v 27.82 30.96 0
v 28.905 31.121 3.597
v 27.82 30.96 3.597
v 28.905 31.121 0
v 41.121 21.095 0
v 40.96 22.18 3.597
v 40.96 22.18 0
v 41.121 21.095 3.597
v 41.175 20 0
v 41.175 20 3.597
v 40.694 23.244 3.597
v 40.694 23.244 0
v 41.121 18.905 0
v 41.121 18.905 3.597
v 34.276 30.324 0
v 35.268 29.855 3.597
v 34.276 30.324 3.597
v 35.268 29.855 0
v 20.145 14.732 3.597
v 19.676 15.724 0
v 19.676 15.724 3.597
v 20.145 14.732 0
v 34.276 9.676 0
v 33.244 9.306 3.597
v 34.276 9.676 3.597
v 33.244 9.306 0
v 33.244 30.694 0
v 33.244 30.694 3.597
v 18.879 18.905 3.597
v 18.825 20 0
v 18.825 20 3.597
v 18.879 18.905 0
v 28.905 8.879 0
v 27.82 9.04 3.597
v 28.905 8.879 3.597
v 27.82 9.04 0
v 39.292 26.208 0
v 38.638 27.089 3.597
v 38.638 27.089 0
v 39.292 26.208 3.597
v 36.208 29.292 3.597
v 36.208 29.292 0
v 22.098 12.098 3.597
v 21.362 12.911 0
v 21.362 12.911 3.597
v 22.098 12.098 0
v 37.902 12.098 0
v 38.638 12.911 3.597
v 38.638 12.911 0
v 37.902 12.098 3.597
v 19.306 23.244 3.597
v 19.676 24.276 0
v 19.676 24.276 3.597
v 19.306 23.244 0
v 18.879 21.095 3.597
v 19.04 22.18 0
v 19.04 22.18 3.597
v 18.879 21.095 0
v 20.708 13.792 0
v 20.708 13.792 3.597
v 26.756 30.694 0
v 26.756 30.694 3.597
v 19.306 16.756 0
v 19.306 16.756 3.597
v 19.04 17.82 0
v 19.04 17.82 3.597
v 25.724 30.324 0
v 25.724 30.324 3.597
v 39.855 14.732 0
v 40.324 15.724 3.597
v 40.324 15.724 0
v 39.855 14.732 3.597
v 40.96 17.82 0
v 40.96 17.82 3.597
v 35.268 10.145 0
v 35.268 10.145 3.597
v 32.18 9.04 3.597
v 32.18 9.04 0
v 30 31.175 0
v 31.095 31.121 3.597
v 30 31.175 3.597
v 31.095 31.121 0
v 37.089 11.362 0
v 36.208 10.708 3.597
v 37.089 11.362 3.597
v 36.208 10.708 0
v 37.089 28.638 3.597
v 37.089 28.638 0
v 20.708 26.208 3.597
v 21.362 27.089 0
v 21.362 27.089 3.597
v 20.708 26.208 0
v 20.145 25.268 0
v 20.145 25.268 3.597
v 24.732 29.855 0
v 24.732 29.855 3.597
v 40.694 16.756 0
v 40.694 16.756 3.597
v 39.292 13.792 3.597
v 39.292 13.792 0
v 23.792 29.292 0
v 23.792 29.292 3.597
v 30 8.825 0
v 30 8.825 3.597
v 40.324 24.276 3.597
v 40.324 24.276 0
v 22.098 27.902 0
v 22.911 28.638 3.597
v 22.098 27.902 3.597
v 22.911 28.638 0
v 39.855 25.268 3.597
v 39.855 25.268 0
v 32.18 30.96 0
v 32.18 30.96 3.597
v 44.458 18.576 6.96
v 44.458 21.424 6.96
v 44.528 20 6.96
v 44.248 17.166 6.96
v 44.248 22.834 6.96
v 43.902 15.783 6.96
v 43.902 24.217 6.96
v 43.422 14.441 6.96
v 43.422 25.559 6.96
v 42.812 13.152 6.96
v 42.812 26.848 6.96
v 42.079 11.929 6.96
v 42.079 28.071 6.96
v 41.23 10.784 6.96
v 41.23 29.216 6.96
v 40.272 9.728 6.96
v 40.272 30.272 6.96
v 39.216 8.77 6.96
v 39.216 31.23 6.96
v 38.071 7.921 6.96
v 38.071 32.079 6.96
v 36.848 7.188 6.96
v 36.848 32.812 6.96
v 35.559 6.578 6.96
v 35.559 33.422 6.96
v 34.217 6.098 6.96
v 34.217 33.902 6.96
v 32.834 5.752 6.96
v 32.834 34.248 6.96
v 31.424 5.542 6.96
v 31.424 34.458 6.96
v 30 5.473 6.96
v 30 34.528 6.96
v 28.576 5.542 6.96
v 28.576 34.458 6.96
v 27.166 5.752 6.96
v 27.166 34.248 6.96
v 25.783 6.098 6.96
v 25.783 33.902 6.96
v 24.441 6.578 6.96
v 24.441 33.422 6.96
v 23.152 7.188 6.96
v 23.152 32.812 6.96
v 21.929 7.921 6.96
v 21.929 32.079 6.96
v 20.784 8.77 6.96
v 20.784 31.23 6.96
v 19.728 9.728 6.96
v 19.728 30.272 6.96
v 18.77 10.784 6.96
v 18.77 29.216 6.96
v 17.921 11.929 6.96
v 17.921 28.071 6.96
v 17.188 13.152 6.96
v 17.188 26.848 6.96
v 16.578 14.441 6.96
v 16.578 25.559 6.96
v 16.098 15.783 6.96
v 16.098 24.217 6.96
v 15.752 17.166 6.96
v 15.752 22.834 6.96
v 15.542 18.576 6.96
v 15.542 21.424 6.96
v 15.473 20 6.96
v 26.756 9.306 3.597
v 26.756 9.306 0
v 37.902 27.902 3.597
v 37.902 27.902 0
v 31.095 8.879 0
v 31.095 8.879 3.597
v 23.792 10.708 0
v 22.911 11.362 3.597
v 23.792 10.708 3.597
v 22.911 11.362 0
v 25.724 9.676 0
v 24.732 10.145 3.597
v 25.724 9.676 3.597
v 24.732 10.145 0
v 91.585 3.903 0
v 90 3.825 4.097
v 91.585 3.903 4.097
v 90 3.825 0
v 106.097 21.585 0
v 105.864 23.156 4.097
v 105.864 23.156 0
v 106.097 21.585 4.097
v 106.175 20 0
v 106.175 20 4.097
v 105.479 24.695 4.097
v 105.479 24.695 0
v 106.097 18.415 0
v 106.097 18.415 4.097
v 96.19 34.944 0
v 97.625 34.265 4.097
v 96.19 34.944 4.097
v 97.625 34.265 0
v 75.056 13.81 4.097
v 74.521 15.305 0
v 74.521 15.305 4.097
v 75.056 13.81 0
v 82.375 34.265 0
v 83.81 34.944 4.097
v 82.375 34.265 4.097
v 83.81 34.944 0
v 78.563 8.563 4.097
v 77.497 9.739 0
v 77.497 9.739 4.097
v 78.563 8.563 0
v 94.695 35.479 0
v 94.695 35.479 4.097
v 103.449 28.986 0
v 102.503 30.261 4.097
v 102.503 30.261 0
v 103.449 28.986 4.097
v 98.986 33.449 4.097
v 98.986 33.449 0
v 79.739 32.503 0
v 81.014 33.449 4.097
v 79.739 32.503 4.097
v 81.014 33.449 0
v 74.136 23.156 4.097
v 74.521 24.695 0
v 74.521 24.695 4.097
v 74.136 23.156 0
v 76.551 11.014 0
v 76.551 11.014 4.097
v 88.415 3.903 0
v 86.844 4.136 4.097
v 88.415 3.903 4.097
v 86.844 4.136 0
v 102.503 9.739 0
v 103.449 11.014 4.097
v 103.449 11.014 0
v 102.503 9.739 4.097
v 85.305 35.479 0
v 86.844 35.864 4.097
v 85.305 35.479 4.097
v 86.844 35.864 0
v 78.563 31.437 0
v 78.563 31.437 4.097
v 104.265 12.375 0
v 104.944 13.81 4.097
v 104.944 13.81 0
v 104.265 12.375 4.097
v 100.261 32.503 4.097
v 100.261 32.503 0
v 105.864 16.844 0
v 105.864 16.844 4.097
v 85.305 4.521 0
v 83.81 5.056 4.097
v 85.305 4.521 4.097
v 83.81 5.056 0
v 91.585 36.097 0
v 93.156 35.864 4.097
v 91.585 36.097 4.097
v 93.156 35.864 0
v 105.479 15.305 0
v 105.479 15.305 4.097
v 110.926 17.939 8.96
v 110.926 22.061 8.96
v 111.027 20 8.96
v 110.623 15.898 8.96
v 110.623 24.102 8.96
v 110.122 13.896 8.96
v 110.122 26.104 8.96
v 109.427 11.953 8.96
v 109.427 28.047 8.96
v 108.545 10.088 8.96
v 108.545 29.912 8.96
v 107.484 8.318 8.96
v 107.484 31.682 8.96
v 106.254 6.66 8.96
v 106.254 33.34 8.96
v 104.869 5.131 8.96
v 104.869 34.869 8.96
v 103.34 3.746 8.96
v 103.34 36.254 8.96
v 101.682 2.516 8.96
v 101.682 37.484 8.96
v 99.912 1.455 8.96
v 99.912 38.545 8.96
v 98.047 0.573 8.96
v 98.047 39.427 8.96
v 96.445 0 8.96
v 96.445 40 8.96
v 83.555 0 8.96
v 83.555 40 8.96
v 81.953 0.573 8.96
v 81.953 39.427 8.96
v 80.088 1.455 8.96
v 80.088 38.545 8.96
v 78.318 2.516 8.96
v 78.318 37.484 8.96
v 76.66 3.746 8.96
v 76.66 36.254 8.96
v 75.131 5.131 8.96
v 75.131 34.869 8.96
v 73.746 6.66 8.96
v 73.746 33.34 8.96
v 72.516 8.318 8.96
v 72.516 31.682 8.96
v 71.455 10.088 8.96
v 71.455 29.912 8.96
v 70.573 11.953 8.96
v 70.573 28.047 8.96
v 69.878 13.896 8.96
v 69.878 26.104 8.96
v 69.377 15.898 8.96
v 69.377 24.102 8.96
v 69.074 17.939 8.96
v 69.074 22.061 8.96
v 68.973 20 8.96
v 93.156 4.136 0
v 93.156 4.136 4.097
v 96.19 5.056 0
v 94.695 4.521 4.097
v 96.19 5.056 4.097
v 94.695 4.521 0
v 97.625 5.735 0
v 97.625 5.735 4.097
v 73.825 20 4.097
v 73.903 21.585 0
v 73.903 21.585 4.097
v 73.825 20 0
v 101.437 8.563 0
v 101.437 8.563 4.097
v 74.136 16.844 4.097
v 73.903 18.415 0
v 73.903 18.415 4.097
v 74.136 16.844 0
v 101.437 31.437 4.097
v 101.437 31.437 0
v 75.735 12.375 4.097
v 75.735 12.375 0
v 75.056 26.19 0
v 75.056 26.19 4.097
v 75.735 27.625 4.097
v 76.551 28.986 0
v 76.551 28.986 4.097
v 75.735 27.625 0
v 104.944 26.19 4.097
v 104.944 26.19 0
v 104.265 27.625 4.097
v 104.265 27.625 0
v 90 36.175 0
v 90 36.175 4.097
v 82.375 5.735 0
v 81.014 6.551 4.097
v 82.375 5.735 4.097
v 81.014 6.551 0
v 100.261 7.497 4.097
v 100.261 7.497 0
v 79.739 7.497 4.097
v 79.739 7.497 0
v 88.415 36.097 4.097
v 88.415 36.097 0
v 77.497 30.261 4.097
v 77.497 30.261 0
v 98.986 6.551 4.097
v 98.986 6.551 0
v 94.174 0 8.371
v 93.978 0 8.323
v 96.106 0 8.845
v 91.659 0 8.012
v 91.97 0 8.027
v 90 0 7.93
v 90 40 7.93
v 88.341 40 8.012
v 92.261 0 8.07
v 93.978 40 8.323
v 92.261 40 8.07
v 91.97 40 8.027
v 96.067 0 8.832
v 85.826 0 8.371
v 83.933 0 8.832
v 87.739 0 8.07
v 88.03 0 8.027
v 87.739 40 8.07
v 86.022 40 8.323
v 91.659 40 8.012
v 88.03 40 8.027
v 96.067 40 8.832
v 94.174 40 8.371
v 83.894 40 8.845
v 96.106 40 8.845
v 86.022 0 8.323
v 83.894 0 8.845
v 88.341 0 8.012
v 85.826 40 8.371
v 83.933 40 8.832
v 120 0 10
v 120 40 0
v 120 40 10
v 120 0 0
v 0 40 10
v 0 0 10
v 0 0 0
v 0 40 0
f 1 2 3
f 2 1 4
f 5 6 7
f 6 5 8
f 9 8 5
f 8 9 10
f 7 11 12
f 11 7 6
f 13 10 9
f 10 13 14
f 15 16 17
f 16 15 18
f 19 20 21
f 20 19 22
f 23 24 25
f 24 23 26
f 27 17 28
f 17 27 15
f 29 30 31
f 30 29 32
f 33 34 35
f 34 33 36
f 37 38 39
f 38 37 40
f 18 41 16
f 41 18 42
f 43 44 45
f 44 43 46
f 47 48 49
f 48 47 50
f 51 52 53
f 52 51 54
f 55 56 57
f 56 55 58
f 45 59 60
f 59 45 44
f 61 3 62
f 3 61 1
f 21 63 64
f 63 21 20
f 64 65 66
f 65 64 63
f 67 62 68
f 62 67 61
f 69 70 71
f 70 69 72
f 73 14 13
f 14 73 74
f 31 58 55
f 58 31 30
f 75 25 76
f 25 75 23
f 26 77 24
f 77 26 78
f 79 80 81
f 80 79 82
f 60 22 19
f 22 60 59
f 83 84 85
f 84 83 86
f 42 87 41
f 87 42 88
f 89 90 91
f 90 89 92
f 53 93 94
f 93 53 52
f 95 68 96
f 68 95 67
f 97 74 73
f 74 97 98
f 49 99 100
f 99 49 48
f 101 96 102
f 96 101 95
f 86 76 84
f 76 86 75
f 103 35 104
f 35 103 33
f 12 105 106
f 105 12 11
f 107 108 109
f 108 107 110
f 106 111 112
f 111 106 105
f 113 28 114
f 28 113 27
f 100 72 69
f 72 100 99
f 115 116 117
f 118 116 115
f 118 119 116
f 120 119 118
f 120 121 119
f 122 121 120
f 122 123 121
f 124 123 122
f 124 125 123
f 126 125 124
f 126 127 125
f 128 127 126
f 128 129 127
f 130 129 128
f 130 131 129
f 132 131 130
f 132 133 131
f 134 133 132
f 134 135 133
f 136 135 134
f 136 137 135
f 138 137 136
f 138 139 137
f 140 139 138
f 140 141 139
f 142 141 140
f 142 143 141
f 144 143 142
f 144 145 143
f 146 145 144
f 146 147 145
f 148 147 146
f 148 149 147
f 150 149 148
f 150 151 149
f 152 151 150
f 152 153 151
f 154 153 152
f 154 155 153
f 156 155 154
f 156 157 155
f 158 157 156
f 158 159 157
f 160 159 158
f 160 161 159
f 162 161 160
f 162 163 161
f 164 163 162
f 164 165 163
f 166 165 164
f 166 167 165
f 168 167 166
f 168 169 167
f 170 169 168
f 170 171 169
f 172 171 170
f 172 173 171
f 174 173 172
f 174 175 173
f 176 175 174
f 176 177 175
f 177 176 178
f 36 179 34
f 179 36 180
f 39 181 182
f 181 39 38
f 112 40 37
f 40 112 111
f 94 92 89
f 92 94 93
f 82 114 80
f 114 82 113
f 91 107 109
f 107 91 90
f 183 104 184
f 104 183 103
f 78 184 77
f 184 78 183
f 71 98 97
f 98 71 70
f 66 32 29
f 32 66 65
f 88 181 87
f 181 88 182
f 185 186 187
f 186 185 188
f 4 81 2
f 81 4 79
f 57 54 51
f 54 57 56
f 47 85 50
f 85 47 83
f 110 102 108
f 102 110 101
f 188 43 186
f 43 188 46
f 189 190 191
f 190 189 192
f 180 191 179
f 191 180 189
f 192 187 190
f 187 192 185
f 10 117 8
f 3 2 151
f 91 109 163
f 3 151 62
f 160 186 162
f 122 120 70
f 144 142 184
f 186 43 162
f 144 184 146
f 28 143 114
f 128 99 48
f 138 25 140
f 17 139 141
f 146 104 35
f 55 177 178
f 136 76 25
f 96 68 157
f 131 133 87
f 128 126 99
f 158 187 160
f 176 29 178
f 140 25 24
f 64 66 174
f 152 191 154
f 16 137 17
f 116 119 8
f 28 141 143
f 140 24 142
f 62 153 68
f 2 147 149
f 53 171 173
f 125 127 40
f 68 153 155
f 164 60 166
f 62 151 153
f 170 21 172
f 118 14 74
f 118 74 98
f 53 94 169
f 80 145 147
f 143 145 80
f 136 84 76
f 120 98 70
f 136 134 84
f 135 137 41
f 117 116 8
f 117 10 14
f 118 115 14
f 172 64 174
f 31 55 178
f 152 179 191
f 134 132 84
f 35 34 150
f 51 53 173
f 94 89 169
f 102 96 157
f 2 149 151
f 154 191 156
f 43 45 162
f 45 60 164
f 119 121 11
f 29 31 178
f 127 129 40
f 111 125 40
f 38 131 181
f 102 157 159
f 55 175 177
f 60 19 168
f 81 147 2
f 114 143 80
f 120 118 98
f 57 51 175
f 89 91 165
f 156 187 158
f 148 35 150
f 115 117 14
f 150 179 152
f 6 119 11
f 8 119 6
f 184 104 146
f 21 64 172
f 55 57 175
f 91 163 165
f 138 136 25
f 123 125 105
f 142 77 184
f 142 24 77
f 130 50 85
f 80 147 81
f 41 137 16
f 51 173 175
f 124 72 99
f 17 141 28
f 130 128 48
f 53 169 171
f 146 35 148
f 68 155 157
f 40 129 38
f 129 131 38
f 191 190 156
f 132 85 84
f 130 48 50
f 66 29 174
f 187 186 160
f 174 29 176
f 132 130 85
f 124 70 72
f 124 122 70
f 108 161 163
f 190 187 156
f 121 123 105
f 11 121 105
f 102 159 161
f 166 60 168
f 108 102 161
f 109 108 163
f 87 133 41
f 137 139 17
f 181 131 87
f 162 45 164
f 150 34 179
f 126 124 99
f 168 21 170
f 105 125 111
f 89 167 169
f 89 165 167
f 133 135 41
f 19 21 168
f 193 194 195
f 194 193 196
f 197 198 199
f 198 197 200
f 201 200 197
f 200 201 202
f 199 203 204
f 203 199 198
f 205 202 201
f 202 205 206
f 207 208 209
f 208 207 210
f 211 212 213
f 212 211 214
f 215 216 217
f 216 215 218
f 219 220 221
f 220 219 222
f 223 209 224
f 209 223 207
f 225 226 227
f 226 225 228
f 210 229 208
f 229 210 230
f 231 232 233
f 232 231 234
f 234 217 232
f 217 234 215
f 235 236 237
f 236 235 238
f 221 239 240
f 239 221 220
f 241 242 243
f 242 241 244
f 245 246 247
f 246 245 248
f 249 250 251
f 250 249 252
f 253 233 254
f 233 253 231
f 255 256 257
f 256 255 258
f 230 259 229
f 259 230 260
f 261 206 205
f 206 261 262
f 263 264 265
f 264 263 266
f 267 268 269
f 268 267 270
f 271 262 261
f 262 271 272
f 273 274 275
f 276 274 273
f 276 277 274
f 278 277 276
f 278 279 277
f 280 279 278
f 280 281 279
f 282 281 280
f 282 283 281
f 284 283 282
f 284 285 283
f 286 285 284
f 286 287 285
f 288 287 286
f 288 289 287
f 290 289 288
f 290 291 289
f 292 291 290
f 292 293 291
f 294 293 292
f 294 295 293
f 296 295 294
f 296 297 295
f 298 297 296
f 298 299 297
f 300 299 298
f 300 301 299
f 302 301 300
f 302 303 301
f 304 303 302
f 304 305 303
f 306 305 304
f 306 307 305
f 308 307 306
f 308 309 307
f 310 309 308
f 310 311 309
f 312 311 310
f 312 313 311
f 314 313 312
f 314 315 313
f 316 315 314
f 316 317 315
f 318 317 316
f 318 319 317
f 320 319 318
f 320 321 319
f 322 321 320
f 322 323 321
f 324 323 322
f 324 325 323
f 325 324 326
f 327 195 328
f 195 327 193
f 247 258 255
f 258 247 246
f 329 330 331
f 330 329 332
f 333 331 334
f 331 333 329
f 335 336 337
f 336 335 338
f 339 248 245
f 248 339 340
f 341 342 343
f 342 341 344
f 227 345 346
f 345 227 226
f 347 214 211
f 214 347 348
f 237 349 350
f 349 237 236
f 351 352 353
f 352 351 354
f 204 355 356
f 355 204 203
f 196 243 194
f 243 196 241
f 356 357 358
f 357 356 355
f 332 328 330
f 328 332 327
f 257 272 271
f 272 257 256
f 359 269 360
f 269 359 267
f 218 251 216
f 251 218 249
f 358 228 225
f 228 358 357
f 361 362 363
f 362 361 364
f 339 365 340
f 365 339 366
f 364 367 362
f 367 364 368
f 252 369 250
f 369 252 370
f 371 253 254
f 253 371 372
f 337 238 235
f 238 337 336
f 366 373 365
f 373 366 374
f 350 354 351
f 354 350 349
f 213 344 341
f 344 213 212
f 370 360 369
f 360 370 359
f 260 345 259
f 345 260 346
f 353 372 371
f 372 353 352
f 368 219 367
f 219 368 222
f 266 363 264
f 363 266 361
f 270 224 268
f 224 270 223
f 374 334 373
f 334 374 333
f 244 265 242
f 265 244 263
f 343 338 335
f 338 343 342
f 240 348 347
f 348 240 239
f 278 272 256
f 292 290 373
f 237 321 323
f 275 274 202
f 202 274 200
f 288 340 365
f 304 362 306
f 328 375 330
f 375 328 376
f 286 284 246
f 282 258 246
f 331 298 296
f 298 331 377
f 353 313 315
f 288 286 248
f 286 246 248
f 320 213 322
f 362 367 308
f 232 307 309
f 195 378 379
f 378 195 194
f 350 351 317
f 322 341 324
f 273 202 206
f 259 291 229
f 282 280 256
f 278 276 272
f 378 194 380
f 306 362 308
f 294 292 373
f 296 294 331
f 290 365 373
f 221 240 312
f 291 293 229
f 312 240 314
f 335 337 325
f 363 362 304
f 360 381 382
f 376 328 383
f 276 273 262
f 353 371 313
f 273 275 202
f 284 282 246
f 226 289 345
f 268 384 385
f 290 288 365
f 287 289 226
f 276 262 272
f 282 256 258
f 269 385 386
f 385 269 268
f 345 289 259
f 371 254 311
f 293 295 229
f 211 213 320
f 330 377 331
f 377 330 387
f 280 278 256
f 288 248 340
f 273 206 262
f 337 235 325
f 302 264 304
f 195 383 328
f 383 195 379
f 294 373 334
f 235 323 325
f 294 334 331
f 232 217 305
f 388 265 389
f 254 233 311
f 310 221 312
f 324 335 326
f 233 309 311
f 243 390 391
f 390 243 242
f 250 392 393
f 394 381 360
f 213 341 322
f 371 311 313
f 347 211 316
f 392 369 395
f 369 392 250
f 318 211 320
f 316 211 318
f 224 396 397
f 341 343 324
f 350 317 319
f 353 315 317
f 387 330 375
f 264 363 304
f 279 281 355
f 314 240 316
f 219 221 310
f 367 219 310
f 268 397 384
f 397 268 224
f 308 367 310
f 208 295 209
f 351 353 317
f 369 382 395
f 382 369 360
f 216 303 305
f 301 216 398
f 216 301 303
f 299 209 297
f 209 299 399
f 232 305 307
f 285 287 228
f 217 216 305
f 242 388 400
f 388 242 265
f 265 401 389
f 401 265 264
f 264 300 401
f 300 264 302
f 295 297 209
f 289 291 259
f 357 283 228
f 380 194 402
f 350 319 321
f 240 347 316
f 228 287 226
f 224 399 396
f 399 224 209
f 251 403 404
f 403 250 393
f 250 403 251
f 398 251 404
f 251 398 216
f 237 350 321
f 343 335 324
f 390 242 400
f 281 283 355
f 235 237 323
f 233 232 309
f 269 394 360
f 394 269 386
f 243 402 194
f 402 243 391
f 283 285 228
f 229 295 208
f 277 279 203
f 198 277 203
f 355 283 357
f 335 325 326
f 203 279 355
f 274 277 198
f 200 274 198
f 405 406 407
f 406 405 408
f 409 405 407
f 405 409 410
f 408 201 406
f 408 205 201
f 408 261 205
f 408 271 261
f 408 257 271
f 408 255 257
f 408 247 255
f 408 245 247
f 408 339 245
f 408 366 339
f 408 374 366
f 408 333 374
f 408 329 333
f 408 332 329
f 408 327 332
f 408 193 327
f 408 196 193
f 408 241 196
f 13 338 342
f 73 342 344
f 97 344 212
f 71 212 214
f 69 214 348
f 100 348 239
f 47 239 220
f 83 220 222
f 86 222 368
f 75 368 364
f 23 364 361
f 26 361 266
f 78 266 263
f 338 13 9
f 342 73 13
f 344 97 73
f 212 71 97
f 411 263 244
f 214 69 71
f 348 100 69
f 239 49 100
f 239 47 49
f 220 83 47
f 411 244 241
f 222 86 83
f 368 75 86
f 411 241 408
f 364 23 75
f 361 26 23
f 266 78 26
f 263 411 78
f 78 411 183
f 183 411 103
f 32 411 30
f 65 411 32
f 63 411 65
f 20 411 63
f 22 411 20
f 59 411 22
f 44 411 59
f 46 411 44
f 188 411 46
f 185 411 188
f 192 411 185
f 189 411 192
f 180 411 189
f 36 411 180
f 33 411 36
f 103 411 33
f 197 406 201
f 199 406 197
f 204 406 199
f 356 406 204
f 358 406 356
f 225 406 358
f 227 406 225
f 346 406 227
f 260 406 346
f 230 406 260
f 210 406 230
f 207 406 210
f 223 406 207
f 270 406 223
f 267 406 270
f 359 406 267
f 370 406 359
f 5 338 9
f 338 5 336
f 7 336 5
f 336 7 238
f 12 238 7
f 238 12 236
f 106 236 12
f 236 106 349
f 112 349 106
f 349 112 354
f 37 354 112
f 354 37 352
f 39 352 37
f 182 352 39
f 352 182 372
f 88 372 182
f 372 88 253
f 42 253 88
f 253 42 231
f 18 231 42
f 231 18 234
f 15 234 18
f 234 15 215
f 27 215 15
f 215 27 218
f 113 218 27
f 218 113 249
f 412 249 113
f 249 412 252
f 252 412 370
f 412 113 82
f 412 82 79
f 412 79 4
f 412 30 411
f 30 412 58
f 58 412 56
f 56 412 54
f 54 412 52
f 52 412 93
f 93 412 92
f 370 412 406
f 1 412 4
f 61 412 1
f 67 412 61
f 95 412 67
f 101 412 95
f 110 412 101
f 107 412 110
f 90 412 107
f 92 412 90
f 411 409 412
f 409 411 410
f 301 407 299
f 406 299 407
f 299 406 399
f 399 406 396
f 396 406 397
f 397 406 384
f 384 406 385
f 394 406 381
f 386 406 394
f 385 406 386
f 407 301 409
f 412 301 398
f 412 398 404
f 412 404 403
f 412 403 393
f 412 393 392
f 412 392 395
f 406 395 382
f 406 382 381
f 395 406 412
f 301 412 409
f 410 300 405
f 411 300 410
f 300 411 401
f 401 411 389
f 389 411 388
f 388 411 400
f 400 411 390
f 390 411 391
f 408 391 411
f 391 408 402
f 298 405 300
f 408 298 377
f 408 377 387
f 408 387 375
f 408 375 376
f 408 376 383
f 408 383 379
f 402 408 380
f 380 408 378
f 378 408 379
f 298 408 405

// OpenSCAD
// file: bearing_iso15.consts.scad
// GENERATED from spec.json by scripts/gen-consts.mjs — DO NOT EDIT.
// interface: bearing_iso15 v0.1.0

B608__BORE = 8;
B608__OD = 22;
B608__WIDTH = 7;
B625__BORE = 5;
B625__OD = 16;
B625__WIDTH = 5;
B6001__BORE = 12;
B6001__OD = 28;
B6001__WIDTH = 8;
B6002__BORE = 15;
B6002__OD = 32;
B6002__WIDTH = 9;
SEAT__MIN_WALL = 2;
SEAT__LIP = 1.2;
SEAT__SHOULDER_CLEARANCE = 0.5;
// file: ../../lib/asm.scad
// ============================================================================
// lib/asm.scad — typed mating features, mirroring the engine's assembly.scad
// ----------------------------------------------------------------------------
// Same signatures, same geometry language, same conventions as the main
// engine (Procedura lib/assembly.scad):
//   * MALE / additive solids  (asm_peg)   -> union() onto the part.
//   * FEMALE / negative tools (asm_socket) -> subtract from the part.
//   * every male tip and female mouth carries a lead-in chamfer so parts
//     self-centre as they seat.
//   * male and female pair from ONE shared nominal + signed fit offset.
// The fit values come from lib/fits.scad — nothing here owns a tolerance.

include <fits.scad>;

// ---- peg ↔ socket ----------------------------------------------------------
// MALE peg, base at origin, growing +Z, chamfered self-centring tip.
module asm_peg(d, len) {
    lead = fit_lead(d);
    union() {
        cylinder(h = max(0.01, len - lead), d = d);
        translate([0, 0, len - lead])
            cylinder(h = lead, d1 = d, d2 = max(0.2, d - 2 * lead));
    }
}

// FEMALE socket, cut from the SAME nominal as its peg. Bore grows with the
// fit class; mouth chamfer eases insertion.
module asm_socket(d, depth, cls = "location") {
    bore = fit_d(d, cls);
    lead = fit_lead(bore);
    union() {
        translate([0, 0, -0.01]) cylinder(h = depth + 0.02, d = bore);
        translate([0, 0, depth - lead])
            cylinder(h = lead + 0.01, d1 = bore, d2 = bore + 2 * lead);
    }
}

// ---- through hole / counterbore --------------------------------------------
// Plain through hole for a fastener of nominal thread d, ISO-273-style.
module asm_through_hole(d, cls = "clearance") {
    bore = fit_d(d, cls);
    lead = fit_lead(bore);
    union() {
        translate([0, 0, -0.01]) cylinder(h = 100000, d = bore, center = false);
        // both mouths chamfered
        translate([0, 0, -0.01 + 100000 - 0.01]) cylinder(h = lead, d1 = bore, d2 = bore + 2 * lead);
    }
}

// Counterbore for a cap/button head: head pocket + shank clearance, both
// derived from the same nominal head diameter and thread.
module asm_counterbore(head_d, head_k, thread_d, cls = "clearance") {
    lead = fit_lead(head_d);
    union() {
        asm_through_hole(thread_d, cls);
        translate([0, 0, -0.01])
            cylinder(h = head_k + fit_delta_d("location"), d = fit_d(head_d, cls));
        translate([0, 0, head_k + fit_delta_d("location") - lead])
            cylinder(h = lead + 0.01, d1 = fit_d(head_d, cls), d2 = fit_d(head_d, cls) + 2 * lead);
    }
}

// ---- nut traps ---------------------------------------------------------------
// Hex nut trap: across-flats s, nut thickness m, from the SAME s.
// Oriented flat-down, opening at -Z (subtract from the part's underside).
module asm_hex_nut_trap(s, m, cls = "location") {
    af = fit_d(s, cls);
    translate([0, 0, -0.01]) {
        cylinder(h = m + fit_delta_d("location") + 0.01, d = af / cos(30), $fn = 6);
        // lead-in on the outer mouth (deeper into the part is -Z here)
        translate([0, 0, m + fit_delta_d("location") - 0.01])
            cylinder(h = fit_lead(af), d1 = af / cos(30), d2 = af / cos(30) + 2 * fit_lead(af), $fn = 6);
    }
}

// Square nut trap: side s, thickness m.
module asm_square_nut_trap(s, m, cls = "location") {
    side = fit_d(s, cls);
    lead = fit_lead(side);
    translate([0, 0, -0.01]) {
        translate([-side / 2, -side / 2, 0])
            cube([side, side, m + fit_delta_d("location") + 0.01]);
        translate([-side / 2, -side / 2, m + fit_delta_d("location") - 0.01])
            cube([side + 2 * lead, side + 2 * lead, lead + 0.02]);
    }
}

// ---- heat-set insert boss -----------------------------------------------------
// Solid boss (MALE — union it on): outer bore holds a brass insert of
// insert_od/insert_len; the top is counterbored so the insert sits flush.
module asm_insert_boss(insert_od, insert_len, wall = 2.4, cls = "snug") {
    bore = fit_d(insert_od, cls);
    od = bore + 2 * wall;
    difference() {
        cylinder(d = od, h = insert_len + wall);
        translate([0, 0, wall])
            cylinder(d = bore, h = insert_len + 0.01);
        // entry chamfer at the insert mouth
        translate([0, 0, wall - fit_lead(bore) + fit_lead(bore)])
            cylinder(h = fit_lead(bore), d1 = bore + 2 * fit_lead(bore), d2 = bore);
    }
}
// file: ../../lib/fits.scad
// ============================================================================
// lib/fits.scad — fit classes and the tolerance table
// ----------------------------------------------------------------------------
// Every mating feature in this library derives its clearance from THIS table,
// never from a second literal. Mirrors the engine's assembly.scad convention
// (asm_socket bore = nominal + signed fit offset) with the engine's class
// names aliased for compatibility ("press" == "snug").
//
// !! STARTING HYPOTHESES, NOT MEASUREMENTS !!
// These are diametral deltas for a 0.4 mm-nozzle FDM printer, PLA, default
// wall settings. They are corrected by physically printing each interface's
// gauge.scad and recording which class actually fits — see README § gauges.
// Until those prints happen and the table is updated, treat every generated
// fit as provisional.

// Diametral offsets (mm), keyed by class. Radial = half these values.
fit_delta = [
  ["clearance", 0.35],  // slides freely
  ["location",  0.15],  // assembles by hand, no slop
  ["snug",     -0.05],  // press fit, needs force
  ["press",    -0.05],  // engine alias for snug
  ["snap",      0.20],  // engine class kept for compatibility
];

function fit_delta_d(cls) =
    let (hit = [for (e = fit_delta) if (e[0] == cls) e[1]])
    len(hit) == 1 ? hit[0]
  : assert(false, str("unknown fit class '", cls, "'")) 0;

// Radial offset — the engine's asm_fit convention (asm_socket adds 2× this).
function fit_delta_r(cls) = fit_delta_d(cls) / 2;

// Resolve a nominal through a fit class: the ONE place tolerances enter.
function fit_d(nominal, cls) = nominal + fit_delta_d(cls);

// Lead-in chamfer length for a feature of diameter d — self-centring mouth.
// Same formula as the engine (max(0.6, 0.15*d)) so parts generated against
// either library seat identically.
function fit_lead(d) = max(0.6, 0.15 * d);
// file: bearing_iso15.scad
// ============================================================================
// interfaces/bearing_iso15/bearing_iso15.scad
// ----------------------------------------------------------------------------
// Seats for ISO 15 deep-groove ball bearings. All numbers come from the
// GENERATED consts file; fits come from lib/fits.scad via lib/asm.scad.

use <../../lib/fits.scad>;
use <../../lib/asm.scad>;
include <bearing_iso15.consts.scad>;

function _bsz(size) =
    size == "608"  ? [B608__BORE, B608__OD, B608__WIDTH] :
    size == "625"  ? [B625__BORE, B625__OD, B625__WIDTH] :
    size == "6001" ? [B6001__BORE, B6001__OD, B6001__WIDTH] :
    size == "6002" ? [B6002__BORE, B6002__OD, B6002__WIDTH] :
    assert(false, str("unknown bearing '", size, "'")) [];

// FEMALE: housing bore for the bearing outer ring, opening at z=0 going +Z.
// press (snug) holds the ring by friction; clearance lets it slide.
module bearing_seat(size, cls = "snug") {
    b = _bsz(size);
    asm_socket(b[1], b[2], cls);
}

// FEMALE: through bore for the inner ring + shaft, sized to the bearing bore.
module bearing_shaft_hole(size, cls = "location") {
    b = _bsz(size);
    asm_socket(b[0], 1000, cls);
}

// MALE: retaining lip — a ring that overhangs the seat mouth to trap the
// bearing axially. Union onto the housing around the seat. z=0 is the face
// the bearing sits against; grows +Z.
module bearing_retaining_lip(size, wall = 2.0, cls = "clearance") {
    b = _bsz(size);
    od = b[1] + 2 * wall;
    difference() {
        // thin ring hugging the seat mouth
        cylinder(d = od, h = SEAT__LIP);
        translate([0, 0, -0.01])
            cylinder(d = fit_d(b[1], cls), h = SEAT__LIP + 0.02);
        // chamfer the inner mouth so the bearing slides past
        translate([0, 0, -0.01])
            cylinder(h = fit_lead(b[1]), d1 = fit_d(b[1], cls), d2 = fit_d(b[1], cls) - 2 * fit_lead(b[1]));
    }
}

// MALE: shoulder ring the bearing's outer ring butts against — a disc of
// bearing od + 2×wall, height = shoulder clearance, with a bore for the
// bearing body. Base at z=0.
module bearing_shoulder(size, wall = 2.0, cls = "clearance") {
    b = _bsz(size);
    difference() {
        cylinder(d = b[1] + 2 * wall, h = SEAT__SHOULDER_CLEARANCE);
        translate([0, 0, -0.01])
            cylinder(d = fit_d(b[1], cls), h = SEAT__SHOULDER_CLEARANCE + 0.02);
    }
}
// main file
// ============================================================================
// test.scad — assertion fixture for bearing_iso15
// ----------------------------------------------------------------------------
// Block 120x40x10 with two generously-spaced seat bores (no chamfer overlap):
//   608  @ (30, 20)   bore+chamfer spans x 15.5–44.5
//   6002 @ (90, 20)   bore+chamfer spans x 71.5–108.5
// Mid-plane holes sit 60 mm apart. All four seat sizes are exercised by the
// gauge plates; this fixture verifies the shared seat code path.

use <bearing_iso15.scad>;

$fn = 64;

module test_block() {
    difference() {
        cube([120, 40, 10]);
        translate([30, 20, -0.05]) bearing_seat("608", "clearance");
        translate([90, 20, -0.05]) bearing_seat("6002", "clearance");
    }
}

test_block();
